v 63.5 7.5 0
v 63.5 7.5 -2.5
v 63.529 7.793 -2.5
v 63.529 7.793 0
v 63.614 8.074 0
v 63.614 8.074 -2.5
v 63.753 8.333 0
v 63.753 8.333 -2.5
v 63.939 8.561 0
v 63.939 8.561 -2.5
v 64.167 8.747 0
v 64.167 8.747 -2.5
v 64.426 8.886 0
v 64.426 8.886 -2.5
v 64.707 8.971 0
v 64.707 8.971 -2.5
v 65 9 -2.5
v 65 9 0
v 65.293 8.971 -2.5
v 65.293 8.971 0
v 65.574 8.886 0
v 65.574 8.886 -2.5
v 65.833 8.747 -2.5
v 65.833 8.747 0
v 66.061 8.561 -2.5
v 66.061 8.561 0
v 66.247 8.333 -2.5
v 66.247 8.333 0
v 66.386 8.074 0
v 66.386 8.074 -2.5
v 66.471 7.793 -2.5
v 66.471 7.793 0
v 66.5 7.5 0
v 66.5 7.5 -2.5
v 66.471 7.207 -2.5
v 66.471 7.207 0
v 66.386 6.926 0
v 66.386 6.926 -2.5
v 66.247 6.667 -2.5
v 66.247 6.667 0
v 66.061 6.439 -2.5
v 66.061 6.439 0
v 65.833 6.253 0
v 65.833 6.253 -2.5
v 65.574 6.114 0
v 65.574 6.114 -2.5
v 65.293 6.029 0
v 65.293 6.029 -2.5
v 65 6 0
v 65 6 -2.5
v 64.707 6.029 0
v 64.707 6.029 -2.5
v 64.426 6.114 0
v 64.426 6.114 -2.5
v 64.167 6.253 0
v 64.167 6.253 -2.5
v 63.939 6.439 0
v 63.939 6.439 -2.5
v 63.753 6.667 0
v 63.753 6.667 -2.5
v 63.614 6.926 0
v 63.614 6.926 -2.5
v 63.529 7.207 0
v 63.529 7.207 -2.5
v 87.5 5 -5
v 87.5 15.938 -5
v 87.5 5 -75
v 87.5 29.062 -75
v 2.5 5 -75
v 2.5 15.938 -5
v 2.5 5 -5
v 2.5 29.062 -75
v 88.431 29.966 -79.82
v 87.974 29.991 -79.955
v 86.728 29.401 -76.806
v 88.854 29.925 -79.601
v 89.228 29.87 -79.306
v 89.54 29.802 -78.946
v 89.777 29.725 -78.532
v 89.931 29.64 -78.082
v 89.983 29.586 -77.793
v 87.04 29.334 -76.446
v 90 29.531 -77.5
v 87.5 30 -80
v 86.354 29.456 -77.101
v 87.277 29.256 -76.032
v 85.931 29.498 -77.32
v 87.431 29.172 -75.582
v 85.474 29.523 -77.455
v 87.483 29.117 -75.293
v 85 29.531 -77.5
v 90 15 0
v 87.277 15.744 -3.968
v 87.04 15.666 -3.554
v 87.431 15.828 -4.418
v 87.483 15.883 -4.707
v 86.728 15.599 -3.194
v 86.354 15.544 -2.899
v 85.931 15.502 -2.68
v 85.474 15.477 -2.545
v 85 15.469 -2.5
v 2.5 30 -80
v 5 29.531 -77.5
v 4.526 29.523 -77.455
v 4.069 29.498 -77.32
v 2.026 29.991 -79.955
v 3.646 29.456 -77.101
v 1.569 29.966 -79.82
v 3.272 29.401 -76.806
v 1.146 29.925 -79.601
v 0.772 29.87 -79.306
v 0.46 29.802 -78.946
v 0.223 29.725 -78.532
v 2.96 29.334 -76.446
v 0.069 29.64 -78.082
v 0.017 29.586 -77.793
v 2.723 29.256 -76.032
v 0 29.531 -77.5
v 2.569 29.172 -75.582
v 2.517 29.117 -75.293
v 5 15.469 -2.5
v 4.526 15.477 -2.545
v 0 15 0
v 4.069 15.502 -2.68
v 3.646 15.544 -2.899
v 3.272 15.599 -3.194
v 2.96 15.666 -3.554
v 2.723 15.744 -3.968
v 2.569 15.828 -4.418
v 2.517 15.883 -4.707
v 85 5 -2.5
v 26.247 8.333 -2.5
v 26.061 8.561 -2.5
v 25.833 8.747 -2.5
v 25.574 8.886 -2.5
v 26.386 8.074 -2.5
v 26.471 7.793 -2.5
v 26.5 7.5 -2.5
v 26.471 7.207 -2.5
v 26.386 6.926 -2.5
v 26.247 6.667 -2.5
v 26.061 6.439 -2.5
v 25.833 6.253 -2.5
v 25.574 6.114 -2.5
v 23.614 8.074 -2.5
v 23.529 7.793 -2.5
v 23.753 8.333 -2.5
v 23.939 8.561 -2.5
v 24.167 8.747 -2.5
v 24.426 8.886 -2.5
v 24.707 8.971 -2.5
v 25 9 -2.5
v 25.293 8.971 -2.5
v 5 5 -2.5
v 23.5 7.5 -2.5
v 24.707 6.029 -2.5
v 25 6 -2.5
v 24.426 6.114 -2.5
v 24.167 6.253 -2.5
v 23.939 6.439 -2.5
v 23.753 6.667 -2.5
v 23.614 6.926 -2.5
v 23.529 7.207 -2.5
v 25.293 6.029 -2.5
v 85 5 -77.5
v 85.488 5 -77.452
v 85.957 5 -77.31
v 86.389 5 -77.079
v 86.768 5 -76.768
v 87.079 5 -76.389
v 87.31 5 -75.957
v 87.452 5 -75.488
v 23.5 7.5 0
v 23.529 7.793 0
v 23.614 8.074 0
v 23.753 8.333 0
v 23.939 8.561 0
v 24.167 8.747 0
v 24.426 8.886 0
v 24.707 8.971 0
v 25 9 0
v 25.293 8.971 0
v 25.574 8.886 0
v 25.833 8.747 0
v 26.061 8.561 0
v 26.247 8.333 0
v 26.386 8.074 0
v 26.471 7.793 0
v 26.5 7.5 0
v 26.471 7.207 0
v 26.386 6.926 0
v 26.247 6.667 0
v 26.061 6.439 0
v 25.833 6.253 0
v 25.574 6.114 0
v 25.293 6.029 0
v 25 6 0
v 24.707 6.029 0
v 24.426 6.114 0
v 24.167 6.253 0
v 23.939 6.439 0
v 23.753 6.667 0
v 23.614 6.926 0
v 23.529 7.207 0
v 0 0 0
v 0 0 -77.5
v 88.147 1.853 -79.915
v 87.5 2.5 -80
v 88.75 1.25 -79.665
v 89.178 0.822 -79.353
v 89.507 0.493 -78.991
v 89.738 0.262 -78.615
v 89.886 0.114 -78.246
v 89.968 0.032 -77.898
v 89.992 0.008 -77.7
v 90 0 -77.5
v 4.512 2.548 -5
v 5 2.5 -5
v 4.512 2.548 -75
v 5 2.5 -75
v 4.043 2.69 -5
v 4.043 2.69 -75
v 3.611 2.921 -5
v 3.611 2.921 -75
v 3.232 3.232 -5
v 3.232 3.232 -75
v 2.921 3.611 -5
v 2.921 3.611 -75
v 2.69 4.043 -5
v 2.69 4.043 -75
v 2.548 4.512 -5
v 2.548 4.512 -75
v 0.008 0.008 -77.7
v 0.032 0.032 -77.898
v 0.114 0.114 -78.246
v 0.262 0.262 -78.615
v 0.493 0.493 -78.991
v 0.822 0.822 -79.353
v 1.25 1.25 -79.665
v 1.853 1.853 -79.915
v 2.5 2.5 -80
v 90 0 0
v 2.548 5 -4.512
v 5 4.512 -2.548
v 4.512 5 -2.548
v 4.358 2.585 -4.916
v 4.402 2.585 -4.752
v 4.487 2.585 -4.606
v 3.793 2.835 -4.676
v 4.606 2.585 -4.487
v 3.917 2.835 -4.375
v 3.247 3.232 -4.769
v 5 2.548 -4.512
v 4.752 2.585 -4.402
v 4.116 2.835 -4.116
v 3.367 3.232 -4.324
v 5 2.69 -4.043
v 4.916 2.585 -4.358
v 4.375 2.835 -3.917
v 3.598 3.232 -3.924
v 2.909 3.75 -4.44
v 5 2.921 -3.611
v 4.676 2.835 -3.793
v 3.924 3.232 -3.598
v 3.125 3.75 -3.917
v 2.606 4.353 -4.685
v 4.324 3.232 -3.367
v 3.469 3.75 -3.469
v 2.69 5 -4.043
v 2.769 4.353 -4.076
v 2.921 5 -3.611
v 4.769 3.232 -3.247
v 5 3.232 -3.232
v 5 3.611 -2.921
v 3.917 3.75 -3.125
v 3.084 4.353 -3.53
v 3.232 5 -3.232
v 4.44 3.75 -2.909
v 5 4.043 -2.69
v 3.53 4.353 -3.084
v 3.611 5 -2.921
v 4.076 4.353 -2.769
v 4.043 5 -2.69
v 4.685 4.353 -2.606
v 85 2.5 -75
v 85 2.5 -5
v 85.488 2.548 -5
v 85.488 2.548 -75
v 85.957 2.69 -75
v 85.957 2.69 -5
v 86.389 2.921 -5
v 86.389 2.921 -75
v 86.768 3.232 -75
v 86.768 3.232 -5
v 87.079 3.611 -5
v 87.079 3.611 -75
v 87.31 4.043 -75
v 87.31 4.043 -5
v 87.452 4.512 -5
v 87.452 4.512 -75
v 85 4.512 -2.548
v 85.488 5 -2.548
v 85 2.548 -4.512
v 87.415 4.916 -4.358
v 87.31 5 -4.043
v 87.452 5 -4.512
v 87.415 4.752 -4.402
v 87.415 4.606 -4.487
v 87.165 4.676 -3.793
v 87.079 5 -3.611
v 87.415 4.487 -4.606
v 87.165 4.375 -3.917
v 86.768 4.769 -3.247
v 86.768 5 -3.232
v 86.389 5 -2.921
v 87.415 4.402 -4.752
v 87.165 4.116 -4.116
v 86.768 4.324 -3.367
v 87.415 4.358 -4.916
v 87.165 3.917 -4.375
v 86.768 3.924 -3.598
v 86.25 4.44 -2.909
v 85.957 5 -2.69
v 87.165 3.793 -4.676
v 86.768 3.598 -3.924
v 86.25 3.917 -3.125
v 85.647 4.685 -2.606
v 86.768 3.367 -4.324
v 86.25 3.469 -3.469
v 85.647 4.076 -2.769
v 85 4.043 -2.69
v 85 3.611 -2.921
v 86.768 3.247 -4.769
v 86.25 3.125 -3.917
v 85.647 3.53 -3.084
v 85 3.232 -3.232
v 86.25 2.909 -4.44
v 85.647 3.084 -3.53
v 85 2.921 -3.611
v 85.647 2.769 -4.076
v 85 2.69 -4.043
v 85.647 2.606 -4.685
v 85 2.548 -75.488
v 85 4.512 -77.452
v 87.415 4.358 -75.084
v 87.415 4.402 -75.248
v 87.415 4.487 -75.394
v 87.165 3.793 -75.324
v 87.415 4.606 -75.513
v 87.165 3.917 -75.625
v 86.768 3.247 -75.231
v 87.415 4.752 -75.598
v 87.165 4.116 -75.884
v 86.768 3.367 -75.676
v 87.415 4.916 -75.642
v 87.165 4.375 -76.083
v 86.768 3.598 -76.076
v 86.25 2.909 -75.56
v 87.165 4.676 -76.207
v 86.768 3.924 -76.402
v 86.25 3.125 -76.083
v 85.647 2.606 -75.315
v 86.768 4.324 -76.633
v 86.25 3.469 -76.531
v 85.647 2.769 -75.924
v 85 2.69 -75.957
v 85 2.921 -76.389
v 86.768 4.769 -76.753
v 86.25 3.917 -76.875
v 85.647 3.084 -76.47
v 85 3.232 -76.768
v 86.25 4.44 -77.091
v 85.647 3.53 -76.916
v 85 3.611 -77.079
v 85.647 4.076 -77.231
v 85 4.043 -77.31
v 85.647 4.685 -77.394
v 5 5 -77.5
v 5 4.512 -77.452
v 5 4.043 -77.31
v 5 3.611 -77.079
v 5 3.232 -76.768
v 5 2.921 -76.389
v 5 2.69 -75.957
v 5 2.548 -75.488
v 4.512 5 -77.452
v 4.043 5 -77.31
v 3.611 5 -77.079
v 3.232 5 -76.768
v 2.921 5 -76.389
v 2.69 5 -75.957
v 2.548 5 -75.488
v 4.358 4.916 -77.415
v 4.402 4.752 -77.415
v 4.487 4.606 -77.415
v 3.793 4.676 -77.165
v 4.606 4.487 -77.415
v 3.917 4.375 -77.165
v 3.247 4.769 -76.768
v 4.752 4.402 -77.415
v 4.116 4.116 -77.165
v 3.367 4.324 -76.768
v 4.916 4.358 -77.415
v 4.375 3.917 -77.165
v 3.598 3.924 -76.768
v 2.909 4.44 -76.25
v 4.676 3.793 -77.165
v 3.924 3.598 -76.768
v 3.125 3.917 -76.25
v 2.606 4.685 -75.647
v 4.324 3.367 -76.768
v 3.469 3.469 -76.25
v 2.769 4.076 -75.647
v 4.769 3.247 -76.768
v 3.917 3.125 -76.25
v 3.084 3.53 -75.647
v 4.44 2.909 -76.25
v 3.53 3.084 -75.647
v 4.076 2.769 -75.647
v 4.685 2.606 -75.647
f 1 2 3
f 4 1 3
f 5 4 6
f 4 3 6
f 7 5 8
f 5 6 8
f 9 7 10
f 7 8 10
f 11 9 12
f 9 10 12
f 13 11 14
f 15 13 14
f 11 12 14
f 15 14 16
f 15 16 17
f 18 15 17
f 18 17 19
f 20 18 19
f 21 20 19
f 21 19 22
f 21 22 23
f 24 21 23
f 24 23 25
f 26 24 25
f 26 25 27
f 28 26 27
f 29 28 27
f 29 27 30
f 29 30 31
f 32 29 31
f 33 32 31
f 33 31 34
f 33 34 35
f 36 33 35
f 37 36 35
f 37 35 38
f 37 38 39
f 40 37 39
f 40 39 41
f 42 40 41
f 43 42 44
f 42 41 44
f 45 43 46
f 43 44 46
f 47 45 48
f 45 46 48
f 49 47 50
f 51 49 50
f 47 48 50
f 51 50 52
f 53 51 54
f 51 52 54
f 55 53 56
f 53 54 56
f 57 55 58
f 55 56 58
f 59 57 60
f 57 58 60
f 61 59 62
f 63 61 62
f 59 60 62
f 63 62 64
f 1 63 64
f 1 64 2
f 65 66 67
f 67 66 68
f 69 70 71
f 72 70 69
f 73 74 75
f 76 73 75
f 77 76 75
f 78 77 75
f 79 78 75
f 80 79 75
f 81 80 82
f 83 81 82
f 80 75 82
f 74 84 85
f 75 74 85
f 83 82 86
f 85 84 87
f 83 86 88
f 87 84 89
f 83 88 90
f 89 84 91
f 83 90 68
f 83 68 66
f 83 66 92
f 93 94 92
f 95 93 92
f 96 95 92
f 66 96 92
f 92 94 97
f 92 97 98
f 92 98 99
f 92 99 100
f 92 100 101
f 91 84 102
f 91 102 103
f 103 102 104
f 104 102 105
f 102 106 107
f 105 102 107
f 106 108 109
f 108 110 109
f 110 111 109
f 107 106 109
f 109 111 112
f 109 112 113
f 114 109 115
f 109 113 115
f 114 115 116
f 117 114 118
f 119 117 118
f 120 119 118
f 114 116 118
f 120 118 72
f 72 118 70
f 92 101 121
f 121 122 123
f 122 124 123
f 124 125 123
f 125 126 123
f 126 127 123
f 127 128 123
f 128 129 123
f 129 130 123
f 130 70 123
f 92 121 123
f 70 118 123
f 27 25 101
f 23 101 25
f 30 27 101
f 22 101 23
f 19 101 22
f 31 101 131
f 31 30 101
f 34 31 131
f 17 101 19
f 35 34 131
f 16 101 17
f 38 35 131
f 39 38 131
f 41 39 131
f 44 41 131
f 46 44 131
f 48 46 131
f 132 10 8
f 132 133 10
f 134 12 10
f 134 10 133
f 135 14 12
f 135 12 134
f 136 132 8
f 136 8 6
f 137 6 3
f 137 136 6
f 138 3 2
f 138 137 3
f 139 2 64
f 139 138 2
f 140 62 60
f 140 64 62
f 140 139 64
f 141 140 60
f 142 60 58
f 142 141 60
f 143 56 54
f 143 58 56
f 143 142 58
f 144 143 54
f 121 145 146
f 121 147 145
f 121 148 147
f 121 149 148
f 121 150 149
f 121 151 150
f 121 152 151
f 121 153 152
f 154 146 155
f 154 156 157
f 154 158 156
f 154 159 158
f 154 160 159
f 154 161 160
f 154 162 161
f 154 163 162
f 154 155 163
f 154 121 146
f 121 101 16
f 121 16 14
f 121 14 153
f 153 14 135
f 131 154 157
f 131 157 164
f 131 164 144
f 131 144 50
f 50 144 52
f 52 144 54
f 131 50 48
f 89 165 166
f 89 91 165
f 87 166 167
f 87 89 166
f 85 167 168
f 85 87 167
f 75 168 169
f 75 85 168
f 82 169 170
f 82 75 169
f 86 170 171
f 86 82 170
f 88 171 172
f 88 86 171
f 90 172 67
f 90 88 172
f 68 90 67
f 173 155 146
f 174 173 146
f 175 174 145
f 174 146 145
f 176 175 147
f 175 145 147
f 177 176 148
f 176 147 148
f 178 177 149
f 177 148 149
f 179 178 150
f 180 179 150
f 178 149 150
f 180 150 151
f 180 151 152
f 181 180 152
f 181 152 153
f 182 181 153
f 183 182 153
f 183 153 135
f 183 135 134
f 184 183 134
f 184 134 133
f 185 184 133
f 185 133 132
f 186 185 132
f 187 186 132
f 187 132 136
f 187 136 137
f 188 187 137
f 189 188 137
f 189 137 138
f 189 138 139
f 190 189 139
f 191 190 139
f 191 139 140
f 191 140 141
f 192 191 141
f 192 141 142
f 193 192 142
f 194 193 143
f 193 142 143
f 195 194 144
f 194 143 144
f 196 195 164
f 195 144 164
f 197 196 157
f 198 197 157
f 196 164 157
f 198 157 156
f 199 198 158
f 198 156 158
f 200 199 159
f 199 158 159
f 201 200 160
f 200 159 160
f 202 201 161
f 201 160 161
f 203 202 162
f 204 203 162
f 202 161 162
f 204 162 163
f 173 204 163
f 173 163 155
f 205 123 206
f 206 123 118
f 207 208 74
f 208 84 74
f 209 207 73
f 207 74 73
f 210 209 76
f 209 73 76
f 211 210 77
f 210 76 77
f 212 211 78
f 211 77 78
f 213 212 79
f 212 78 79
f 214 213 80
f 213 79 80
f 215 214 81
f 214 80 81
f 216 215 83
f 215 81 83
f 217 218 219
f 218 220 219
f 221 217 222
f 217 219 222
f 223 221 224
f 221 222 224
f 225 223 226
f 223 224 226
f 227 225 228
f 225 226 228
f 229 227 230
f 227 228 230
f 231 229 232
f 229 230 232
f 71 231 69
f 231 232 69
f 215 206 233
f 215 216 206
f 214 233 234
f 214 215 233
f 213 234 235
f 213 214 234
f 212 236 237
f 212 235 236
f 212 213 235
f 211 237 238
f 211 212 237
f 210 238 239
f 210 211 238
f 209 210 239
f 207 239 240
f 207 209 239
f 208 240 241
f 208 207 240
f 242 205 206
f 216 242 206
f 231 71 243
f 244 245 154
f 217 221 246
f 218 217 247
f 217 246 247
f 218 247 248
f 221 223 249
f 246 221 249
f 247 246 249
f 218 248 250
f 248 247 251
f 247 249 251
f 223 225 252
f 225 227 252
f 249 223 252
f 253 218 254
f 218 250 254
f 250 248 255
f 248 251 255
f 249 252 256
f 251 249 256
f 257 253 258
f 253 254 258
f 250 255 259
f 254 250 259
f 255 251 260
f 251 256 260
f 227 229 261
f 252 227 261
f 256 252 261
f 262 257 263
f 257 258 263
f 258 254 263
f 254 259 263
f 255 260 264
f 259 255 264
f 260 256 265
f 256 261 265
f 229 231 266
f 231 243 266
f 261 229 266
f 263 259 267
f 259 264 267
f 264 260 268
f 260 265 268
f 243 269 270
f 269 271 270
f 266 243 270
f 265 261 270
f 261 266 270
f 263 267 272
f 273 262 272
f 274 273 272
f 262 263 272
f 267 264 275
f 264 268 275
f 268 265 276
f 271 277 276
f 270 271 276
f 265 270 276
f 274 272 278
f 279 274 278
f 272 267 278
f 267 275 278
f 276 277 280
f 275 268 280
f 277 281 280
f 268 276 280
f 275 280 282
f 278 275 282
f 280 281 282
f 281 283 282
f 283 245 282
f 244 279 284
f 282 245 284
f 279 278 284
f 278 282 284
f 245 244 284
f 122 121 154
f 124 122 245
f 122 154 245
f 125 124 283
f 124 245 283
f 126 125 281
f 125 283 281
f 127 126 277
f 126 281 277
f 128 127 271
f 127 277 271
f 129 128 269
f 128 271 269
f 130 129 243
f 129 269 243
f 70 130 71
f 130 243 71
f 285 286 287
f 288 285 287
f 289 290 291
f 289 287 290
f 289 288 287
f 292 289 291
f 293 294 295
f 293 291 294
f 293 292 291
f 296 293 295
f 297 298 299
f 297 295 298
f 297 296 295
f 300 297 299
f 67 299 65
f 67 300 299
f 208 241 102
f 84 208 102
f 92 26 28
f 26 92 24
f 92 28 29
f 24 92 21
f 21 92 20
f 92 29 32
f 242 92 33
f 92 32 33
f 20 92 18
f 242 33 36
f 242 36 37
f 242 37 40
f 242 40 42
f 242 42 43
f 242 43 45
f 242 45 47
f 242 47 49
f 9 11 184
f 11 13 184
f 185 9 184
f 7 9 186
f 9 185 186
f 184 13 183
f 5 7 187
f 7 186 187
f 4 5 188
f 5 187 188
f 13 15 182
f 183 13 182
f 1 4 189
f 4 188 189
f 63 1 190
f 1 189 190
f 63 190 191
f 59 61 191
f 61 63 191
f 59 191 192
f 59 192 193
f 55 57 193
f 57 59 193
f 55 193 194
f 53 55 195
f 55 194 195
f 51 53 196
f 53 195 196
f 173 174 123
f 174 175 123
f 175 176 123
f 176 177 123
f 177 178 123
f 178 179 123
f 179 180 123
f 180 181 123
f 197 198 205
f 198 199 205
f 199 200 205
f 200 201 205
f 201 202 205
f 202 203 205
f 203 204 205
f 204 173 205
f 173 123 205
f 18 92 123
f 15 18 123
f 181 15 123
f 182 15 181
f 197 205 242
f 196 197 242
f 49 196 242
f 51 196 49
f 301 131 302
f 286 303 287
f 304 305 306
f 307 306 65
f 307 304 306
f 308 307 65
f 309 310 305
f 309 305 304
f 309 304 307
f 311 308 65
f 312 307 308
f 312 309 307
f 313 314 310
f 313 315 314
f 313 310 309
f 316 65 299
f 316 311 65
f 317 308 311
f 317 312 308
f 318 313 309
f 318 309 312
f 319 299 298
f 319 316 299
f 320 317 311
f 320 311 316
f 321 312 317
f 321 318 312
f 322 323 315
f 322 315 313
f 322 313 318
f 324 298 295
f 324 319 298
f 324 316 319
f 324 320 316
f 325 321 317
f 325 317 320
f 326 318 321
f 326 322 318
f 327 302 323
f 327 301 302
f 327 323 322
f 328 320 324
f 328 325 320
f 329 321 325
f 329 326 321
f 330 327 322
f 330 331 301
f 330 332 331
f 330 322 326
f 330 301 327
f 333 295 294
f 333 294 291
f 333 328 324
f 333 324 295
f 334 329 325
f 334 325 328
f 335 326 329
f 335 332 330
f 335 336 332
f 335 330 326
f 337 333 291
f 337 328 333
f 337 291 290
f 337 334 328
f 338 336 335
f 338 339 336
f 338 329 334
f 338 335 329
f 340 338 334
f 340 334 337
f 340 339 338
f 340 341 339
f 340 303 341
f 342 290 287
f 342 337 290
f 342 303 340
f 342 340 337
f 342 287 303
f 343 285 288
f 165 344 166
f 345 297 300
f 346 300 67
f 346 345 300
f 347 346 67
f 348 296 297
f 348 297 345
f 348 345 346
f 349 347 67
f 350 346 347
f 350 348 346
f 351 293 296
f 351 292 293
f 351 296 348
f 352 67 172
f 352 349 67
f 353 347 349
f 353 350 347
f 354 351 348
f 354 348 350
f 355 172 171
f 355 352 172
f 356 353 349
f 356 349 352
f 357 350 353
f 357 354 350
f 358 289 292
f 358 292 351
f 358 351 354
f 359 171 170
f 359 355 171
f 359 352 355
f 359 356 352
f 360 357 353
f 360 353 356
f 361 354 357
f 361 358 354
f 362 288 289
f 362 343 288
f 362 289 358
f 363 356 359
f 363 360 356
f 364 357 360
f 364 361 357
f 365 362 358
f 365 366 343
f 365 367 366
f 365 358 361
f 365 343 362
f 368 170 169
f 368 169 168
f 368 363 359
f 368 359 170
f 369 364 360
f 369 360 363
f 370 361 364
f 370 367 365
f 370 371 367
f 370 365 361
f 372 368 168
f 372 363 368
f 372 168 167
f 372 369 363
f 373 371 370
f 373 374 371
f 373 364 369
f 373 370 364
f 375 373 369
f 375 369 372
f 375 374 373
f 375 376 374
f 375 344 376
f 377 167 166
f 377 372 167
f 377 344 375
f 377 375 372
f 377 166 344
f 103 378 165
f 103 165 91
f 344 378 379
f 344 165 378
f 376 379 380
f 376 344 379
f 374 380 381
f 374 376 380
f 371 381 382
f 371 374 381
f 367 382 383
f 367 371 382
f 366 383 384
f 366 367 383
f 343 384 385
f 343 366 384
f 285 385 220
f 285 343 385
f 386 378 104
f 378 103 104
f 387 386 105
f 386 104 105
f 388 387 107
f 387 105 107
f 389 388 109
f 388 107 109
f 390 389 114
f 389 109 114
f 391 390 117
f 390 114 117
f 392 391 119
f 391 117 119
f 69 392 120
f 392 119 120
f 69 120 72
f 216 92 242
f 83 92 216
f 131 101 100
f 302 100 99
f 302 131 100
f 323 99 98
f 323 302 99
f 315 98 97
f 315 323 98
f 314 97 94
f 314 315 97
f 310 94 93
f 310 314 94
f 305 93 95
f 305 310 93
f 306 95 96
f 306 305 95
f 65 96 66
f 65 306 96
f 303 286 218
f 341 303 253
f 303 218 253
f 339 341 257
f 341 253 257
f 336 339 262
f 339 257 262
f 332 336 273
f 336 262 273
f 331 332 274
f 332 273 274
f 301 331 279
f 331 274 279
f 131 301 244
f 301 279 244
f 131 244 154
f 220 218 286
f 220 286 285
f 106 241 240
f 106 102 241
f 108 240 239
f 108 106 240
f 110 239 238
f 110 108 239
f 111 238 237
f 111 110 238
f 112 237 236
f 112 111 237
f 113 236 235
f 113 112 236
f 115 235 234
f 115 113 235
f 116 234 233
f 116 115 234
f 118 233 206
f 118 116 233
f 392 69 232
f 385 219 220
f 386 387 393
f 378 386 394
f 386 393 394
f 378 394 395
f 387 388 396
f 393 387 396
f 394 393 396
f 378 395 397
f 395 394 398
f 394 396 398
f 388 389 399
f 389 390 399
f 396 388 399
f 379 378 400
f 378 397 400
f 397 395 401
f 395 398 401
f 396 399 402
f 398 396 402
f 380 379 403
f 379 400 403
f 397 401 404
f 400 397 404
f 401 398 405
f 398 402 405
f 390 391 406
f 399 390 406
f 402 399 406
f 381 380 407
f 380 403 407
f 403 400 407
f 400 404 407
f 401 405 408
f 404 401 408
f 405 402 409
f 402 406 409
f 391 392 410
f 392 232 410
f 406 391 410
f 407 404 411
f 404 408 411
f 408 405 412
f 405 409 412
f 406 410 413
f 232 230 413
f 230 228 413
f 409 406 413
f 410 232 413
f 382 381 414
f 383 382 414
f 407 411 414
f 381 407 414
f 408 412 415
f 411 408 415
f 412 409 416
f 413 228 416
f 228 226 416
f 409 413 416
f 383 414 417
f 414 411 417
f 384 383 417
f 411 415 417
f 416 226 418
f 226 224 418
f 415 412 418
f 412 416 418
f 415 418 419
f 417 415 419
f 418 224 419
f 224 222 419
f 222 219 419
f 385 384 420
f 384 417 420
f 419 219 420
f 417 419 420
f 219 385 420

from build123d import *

# Parameters (mm, degrees)
BOSS_EXTRUDE1_DEPTH       = 90
SHELL1_T                  = -2.5
FILLET1_R                 = 2.5
F_3_0MM_DOWEL_HOLE1_D     = 3
F_3_0MM_DOWEL_HOLE1_DEPTH = 2.5


with BuildPart() as part:
    # Sketch2 → Boss-Extrude1 (new body)
    with BuildSketch(Plane(origin=(0, 0, 0), x_dir=(0, 0, -1), z_dir=(1, 0, 0))):
        Polygon((0, 0), (80, 0), (80, 30), (0, 15), align=None)
    extrude(amount=BOSS_EXTRUDE1_DEPTH)

    # Shell1
    shell1_openings = [part.faces().sort_by_distance(p)[0] for p in [
        (45, 22.5, -40),
    ]]
    offset(amount=SHELL1_T, openings=shell1_openings, kind=Kind.INTERSECTION)

    # Fillet1
    fillet1_edges = [part.edges().sort_by_distance(p)[0] for p in [
        (90, 15, -80),
        (2.5, 8.984375, -2.5),
        (2.5, 2.5, -40),
        (45, 2.5, -2.5),
        (2.5, 16.015625, -77.5),
        (45, 2.5, -77.5),
        (87.5, 8.984375, -2.5),
        (87.5, 2.5, -40),
        (87.5, 16.015625, -77.5),
        (0, 15, -80),
        (45, 0, -80),
    ]]
    fillet(fillet1_edges, radius=FILLET1_R)

    # Ø3.0mm Dowel Hole1
    with Locations(Plane.XY):
        with Locations((25, 7.5), (65, 7.5)):
            Hole(F_3_0MM_DOWEL_HOLE1_D / 2, depth=F_3_0MM_DOWEL_HOLE1_DEPTH)


solid = part.part
